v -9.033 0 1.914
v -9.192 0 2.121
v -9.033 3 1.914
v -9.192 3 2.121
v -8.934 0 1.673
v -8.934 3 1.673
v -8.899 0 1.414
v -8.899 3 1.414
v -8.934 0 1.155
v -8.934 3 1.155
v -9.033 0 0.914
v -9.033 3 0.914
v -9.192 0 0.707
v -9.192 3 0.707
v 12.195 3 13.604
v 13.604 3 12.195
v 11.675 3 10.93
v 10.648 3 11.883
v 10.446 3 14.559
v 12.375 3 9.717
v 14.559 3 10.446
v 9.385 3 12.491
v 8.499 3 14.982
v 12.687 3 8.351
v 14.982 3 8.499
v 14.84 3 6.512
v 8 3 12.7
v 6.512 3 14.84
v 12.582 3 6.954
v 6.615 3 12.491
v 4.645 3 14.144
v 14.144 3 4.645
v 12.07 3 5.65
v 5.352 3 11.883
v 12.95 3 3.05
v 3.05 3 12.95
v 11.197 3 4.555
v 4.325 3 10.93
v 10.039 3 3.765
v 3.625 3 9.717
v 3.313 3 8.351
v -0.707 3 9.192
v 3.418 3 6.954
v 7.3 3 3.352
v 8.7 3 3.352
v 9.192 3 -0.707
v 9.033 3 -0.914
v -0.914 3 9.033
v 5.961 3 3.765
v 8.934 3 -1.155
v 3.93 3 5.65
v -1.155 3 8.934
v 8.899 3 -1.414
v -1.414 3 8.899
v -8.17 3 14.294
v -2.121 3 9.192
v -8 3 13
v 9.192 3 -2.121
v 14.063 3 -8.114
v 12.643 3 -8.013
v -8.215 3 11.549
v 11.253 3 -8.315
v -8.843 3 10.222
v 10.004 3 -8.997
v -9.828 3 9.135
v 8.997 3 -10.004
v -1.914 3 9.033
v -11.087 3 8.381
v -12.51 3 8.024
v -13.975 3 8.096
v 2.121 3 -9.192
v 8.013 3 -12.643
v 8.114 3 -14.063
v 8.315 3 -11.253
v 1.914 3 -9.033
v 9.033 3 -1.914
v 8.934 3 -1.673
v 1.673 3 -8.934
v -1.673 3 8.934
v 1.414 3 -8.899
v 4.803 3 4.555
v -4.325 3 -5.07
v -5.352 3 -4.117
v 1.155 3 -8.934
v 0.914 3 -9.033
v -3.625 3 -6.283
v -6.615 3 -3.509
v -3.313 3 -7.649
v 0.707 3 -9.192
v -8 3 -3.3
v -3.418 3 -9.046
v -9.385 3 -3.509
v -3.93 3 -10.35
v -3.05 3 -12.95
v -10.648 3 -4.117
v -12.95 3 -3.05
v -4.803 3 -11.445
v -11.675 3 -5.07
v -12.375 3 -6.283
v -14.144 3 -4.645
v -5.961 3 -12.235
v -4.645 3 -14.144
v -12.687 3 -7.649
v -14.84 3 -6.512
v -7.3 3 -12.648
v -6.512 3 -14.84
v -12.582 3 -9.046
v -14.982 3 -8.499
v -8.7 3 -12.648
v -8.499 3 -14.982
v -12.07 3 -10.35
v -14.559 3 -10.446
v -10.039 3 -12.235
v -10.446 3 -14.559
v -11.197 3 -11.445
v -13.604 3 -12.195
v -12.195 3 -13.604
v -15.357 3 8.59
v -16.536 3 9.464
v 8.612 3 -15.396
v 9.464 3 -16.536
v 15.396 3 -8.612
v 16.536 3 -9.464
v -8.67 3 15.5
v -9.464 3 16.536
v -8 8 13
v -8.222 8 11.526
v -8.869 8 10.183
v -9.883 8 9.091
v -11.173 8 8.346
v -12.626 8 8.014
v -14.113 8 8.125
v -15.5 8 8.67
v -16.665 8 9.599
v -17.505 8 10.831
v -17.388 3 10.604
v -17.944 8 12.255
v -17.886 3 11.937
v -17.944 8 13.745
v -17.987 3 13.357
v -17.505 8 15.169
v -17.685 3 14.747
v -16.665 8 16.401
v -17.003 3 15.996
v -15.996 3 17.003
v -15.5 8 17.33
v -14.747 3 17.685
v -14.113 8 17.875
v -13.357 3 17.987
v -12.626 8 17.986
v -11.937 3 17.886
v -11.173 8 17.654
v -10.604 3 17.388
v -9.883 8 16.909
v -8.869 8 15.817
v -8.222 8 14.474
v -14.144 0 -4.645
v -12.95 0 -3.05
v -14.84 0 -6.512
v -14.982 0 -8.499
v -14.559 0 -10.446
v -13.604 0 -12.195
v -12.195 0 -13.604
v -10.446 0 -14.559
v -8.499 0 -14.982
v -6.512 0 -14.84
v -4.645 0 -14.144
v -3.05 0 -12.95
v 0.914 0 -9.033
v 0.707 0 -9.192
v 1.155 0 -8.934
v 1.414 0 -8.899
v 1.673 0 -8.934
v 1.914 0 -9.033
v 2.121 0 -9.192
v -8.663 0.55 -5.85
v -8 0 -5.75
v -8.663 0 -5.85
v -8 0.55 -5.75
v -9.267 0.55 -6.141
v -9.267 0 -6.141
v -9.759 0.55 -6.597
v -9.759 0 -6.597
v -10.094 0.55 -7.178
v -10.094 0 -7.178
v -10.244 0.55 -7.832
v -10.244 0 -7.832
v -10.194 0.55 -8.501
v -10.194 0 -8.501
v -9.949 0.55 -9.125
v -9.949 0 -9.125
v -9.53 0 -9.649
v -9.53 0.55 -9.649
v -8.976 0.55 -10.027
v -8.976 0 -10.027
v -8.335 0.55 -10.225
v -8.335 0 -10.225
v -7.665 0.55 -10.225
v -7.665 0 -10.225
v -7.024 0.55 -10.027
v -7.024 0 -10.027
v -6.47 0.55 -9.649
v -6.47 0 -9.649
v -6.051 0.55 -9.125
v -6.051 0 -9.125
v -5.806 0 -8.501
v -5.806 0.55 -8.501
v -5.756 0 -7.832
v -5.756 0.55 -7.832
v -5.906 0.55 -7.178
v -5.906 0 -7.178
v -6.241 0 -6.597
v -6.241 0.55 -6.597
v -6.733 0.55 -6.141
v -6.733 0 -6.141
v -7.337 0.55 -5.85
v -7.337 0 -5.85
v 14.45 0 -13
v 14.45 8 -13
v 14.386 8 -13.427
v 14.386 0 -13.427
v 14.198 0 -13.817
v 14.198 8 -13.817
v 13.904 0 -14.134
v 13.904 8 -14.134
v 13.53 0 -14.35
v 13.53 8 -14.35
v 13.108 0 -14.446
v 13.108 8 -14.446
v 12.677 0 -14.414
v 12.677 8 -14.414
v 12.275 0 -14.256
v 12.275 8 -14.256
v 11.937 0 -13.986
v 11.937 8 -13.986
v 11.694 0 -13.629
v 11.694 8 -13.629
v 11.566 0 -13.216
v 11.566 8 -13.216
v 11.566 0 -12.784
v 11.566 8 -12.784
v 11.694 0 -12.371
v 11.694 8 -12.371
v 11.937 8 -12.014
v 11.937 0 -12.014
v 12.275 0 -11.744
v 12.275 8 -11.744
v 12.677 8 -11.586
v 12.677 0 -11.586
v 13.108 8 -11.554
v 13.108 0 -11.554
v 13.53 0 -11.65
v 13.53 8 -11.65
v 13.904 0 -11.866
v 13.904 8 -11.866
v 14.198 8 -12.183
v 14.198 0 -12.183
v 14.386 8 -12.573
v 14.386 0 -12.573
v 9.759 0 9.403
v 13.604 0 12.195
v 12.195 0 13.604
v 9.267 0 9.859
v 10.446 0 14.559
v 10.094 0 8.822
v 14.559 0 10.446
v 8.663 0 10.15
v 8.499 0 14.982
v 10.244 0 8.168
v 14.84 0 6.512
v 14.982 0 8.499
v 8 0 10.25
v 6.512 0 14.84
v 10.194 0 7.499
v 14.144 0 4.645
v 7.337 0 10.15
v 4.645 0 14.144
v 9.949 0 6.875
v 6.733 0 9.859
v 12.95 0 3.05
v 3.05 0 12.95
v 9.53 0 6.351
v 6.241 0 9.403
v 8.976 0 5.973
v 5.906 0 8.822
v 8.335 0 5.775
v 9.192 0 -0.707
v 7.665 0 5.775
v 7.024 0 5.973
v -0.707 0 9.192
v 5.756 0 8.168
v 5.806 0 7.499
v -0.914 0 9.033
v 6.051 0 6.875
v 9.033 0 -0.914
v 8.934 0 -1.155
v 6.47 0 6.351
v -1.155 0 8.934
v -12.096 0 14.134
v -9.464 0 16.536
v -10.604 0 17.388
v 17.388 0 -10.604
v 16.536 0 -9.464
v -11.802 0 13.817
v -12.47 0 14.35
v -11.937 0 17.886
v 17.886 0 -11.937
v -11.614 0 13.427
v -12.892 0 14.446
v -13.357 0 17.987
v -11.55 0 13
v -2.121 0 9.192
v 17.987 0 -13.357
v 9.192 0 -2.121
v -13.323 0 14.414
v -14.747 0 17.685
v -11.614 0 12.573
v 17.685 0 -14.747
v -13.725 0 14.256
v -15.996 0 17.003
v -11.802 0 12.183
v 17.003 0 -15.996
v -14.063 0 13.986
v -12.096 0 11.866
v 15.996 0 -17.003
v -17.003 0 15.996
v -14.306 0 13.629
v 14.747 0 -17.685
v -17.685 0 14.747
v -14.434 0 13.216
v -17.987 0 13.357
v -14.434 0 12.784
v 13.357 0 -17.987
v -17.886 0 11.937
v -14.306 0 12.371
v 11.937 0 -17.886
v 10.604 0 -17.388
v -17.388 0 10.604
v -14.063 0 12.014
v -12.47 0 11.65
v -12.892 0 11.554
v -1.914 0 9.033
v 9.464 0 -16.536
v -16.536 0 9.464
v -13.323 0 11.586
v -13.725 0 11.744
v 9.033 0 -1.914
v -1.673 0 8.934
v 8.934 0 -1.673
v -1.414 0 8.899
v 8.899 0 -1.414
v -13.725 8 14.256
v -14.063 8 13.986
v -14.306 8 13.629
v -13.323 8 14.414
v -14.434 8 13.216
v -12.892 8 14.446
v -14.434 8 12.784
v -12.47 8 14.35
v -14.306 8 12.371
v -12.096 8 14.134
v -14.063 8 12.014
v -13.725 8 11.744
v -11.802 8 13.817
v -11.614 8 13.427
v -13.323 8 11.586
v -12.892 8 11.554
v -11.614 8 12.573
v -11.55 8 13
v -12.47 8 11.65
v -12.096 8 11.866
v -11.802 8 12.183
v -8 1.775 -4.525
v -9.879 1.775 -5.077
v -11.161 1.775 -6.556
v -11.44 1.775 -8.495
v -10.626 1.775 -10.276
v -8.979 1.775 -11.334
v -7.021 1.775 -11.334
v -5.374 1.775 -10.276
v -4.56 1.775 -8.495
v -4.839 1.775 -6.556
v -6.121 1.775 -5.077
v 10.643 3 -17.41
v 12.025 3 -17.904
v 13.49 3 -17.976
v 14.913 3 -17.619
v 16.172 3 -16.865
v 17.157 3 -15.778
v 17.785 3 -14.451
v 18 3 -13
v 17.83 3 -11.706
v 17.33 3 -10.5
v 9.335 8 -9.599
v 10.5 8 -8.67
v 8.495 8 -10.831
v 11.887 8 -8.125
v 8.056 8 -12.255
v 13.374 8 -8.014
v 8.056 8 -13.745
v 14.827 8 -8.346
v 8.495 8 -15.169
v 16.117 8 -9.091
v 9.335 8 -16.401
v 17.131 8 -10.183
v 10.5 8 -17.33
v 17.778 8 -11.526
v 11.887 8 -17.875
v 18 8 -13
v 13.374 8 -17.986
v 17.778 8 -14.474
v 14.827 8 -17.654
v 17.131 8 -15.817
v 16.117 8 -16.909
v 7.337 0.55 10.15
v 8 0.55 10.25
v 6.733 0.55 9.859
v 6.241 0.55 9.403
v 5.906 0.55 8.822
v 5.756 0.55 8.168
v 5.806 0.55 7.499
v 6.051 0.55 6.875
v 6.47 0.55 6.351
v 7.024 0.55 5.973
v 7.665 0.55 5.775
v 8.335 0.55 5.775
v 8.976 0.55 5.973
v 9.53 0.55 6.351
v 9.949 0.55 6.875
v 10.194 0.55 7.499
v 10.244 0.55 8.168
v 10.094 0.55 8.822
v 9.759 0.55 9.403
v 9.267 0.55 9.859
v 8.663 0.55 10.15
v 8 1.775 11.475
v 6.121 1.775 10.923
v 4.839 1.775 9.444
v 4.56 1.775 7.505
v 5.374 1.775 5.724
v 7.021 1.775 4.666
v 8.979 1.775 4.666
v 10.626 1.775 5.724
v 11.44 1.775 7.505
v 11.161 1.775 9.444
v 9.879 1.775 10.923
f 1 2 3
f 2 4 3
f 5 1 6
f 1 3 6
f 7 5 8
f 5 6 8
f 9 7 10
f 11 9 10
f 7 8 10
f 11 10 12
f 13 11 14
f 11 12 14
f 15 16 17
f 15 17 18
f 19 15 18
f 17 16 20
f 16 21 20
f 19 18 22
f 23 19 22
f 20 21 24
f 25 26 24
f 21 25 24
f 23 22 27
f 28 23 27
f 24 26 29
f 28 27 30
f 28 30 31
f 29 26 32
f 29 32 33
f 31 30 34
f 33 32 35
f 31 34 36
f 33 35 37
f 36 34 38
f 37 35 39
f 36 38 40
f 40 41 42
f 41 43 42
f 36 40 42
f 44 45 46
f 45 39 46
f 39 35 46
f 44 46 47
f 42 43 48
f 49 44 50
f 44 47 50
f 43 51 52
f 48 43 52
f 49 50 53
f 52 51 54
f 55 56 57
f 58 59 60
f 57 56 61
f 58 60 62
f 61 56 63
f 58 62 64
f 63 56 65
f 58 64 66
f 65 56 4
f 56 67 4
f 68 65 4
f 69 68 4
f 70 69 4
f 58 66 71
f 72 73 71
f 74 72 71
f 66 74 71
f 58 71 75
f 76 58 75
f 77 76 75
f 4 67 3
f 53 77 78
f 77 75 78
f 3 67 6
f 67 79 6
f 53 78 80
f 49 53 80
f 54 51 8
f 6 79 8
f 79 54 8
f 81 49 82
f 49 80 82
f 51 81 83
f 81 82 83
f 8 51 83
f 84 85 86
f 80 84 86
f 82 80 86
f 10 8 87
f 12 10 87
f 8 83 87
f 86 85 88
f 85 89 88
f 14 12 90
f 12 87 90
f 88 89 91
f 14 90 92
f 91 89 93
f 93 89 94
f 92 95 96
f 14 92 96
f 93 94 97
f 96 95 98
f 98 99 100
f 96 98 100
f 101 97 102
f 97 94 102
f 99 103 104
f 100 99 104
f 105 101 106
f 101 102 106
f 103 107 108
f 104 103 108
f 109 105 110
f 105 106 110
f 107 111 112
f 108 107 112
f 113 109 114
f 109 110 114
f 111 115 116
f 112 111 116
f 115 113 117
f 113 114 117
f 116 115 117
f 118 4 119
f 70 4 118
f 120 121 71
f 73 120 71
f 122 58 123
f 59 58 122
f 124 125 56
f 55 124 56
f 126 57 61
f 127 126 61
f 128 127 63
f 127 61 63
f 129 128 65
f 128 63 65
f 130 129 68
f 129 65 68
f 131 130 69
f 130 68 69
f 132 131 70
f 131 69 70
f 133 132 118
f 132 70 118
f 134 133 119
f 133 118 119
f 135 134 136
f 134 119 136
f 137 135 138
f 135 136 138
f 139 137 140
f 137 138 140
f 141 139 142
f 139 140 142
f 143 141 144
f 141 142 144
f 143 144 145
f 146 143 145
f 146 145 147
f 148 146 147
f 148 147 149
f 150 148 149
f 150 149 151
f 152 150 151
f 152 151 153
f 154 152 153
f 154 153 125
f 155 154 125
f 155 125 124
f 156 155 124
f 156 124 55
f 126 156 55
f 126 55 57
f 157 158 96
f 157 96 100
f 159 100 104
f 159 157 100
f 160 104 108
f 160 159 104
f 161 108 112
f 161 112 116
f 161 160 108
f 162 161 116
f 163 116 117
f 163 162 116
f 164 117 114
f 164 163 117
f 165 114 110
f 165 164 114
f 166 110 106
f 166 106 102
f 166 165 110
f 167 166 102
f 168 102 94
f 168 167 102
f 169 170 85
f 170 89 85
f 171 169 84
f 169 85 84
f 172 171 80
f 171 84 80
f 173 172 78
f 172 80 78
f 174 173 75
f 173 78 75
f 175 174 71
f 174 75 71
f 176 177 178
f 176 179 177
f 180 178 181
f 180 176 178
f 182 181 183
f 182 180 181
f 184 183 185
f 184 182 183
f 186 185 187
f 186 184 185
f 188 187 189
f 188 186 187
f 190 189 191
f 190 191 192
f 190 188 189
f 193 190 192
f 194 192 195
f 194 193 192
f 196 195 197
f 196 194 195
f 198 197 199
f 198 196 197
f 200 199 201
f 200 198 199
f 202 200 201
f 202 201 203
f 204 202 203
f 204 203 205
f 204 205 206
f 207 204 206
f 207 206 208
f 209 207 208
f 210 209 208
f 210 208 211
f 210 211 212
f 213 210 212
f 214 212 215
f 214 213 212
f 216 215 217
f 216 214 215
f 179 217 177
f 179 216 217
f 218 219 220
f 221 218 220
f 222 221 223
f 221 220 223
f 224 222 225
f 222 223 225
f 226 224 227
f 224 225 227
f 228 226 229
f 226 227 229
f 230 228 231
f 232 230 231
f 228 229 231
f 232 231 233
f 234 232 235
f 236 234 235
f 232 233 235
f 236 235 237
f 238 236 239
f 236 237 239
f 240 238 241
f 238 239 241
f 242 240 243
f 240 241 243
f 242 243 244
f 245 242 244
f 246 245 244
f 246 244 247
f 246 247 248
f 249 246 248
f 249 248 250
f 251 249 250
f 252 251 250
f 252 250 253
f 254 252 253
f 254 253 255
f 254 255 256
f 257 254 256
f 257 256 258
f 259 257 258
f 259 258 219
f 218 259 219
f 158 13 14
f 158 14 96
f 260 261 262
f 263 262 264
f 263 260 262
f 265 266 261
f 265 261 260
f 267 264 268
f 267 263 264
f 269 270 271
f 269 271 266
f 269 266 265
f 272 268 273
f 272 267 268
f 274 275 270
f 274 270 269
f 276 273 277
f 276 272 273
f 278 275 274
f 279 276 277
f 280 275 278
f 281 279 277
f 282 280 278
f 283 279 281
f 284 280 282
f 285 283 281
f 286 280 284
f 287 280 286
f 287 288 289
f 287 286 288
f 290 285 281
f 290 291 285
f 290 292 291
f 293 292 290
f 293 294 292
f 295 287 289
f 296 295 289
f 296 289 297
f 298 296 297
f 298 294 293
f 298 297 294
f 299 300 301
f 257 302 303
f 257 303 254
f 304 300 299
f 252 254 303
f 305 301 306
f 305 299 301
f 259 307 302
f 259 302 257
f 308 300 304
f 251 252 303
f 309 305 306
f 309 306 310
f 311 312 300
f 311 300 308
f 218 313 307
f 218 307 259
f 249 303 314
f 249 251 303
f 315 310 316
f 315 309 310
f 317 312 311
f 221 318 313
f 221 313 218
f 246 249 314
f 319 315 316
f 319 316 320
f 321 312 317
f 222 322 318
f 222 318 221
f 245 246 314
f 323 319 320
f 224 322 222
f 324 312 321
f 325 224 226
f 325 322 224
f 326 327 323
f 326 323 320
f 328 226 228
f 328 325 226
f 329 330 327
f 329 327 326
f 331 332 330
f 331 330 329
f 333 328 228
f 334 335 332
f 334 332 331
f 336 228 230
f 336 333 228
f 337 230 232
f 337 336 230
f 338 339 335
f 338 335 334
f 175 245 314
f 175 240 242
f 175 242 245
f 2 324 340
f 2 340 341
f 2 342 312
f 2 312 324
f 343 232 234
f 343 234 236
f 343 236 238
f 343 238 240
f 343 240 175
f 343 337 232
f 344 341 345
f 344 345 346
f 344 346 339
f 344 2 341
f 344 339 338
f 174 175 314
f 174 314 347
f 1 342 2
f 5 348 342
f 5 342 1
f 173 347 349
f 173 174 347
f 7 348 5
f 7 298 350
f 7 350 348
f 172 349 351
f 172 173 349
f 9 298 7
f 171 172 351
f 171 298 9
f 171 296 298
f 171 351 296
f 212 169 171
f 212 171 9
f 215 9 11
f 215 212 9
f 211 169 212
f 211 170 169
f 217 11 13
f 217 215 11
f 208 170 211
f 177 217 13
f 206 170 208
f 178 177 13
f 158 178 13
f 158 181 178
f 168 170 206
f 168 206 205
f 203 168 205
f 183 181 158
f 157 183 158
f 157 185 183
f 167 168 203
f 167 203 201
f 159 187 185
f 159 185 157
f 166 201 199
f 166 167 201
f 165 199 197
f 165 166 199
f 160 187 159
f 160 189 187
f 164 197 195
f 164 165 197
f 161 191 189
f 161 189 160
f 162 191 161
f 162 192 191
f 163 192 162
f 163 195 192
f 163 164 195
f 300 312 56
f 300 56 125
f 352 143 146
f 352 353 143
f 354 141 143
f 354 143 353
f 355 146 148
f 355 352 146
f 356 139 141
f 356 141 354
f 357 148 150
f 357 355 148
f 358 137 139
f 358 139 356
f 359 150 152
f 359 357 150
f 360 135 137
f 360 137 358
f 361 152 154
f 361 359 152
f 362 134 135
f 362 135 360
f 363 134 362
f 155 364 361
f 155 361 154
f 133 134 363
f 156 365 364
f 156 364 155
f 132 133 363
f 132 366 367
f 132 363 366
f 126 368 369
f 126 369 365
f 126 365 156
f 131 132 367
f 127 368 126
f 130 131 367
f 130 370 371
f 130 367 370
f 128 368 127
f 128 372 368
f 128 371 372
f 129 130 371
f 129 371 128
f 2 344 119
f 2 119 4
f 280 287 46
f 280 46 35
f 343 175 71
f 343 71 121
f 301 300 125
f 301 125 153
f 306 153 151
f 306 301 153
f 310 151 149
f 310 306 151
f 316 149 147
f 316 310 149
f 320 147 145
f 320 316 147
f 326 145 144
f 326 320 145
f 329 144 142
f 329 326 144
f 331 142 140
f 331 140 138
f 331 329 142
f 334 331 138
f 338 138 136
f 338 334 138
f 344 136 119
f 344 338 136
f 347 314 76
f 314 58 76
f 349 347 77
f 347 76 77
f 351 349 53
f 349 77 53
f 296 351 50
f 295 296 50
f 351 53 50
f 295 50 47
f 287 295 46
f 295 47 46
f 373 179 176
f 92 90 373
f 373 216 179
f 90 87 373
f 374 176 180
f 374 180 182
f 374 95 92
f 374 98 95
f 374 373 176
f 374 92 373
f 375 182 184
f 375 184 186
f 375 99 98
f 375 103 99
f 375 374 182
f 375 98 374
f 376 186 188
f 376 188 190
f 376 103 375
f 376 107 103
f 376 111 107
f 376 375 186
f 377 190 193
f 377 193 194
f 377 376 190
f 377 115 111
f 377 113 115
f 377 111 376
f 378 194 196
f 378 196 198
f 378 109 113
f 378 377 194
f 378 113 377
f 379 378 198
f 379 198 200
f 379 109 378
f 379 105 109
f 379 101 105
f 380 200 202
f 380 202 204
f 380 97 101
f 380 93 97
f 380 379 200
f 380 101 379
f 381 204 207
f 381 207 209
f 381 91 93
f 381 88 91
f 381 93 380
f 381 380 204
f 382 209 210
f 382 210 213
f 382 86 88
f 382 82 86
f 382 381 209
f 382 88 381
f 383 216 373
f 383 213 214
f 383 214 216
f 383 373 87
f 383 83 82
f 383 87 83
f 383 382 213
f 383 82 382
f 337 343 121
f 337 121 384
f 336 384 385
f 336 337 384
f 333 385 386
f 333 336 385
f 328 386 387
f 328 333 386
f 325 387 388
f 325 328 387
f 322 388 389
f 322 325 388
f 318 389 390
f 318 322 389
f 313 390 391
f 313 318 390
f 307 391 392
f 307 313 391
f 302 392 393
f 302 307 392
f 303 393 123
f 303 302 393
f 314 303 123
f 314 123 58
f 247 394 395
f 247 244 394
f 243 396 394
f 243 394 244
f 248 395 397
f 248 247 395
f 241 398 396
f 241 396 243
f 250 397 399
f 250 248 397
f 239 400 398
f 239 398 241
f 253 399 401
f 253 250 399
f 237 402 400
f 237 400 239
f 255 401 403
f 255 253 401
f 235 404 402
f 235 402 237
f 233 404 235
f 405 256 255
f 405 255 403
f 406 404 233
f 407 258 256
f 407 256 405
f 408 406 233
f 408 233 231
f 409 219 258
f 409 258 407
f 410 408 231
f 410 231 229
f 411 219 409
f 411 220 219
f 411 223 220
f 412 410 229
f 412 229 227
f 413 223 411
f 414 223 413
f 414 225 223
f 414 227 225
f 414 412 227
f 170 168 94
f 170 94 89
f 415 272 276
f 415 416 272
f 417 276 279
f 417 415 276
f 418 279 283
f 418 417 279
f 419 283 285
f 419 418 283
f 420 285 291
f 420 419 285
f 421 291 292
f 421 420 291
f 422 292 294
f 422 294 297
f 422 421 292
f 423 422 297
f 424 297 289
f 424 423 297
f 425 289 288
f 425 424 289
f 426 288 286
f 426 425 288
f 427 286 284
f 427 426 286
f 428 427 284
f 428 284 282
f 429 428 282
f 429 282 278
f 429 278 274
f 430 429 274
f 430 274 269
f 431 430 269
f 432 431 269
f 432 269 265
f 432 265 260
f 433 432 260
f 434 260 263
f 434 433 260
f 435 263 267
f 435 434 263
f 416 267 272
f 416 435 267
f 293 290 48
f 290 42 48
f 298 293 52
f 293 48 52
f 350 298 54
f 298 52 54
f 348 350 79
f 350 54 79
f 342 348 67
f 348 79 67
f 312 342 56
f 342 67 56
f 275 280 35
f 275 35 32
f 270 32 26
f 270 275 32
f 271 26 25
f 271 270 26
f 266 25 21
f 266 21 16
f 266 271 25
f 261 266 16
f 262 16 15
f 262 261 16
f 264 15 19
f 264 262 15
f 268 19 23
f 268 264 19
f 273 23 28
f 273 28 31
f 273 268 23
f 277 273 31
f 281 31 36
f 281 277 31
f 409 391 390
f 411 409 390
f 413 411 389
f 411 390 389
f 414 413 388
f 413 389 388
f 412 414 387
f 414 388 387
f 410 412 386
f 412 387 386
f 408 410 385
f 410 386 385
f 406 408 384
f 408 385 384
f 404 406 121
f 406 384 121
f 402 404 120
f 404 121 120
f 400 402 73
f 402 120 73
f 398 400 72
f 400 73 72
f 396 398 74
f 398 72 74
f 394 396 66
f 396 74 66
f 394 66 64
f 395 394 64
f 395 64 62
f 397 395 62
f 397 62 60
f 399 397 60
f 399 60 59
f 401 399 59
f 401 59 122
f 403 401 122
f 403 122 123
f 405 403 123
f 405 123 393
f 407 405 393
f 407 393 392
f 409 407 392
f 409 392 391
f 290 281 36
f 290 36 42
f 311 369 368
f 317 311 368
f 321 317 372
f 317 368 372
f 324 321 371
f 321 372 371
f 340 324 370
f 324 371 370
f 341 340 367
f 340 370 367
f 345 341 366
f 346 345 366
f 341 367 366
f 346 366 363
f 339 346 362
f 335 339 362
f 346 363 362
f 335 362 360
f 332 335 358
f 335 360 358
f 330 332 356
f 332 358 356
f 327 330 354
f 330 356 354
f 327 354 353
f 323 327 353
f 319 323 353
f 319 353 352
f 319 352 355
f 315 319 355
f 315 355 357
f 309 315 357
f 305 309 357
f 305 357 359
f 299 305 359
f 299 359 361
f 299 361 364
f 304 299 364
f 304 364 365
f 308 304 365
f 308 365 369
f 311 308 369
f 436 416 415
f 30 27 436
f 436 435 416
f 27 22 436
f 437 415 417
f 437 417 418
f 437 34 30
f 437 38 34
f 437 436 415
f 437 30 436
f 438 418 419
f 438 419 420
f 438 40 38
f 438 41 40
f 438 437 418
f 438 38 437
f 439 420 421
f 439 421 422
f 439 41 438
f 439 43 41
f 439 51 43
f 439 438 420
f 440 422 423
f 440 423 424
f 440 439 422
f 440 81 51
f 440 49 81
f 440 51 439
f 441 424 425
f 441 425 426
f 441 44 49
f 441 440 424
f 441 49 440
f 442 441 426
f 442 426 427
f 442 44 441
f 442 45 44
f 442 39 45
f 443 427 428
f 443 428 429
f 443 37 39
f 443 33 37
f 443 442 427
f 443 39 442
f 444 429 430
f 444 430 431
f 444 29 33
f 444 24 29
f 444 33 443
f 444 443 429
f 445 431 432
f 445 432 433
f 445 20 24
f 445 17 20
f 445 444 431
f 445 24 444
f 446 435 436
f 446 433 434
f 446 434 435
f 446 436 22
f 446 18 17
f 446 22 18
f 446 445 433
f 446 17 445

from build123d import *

# Parameters (mm, degrees)
BOSS_EXTRUDE1_DEPTH                          = 3
FILLET1_R                                    = 1
CSK_FOR_M4_COUNTERSUNK_FLAT_HEAD_SCR_2_COUNT = 2
CSK_FOR_M4_COUNTERSUNK_FLAT_HEAD_SCR_2_PITCH = 22.627416998
SKETCH4_R                                    = 5
BOSS_EXTRUDE2_DEPTH                          = 5
SKETCH5_R                                    = 1.45
CUT_EXTRUDE1_DEPTH                           = 9


with BuildPart() as part:
    # Sketch1 → Boss-Extrude1 (new body)
    with BuildSketch(Plane(origin=(0, 0, 0), x_dir=(1, 0, 0), z_dir=(0, 1, 0))):
        with BuildLine():
            Line((-16.535533906, -9.464466094), (-8.485281374, -1.414213562))
            Line((-8.485281374, -1.414213562), (-12.949747468, 3.050252532))
            ThreePointArc((-12.949747468, 3.050252532), (-12.949747468, 12.949747468), (-3.050252532, 12.949747468))
            Line((-3.050252532, 12.949747468), (1.414213562, 8.485281374))
            Line((1.414213562, 8.485281374), (9.464466094, 16.535533906))
            ThreePointArc((9.464466094, 16.535533906), (16.535533906, 16.535533906), (16.535533906, 9.464466094))
            Line((16.535533906, 9.464466094), (8.485281374, 1.414213562))
            Line((8.485281374, 1.414213562), (12.949747468, -3.050252532))
            ThreePointArc((12.949747468, -3.050252532), (12.949747468, -12.949747468), (3.050252532, -12.949747468))
            Line((3.050252532, -12.949747468), (-1.414213562, -8.485281374))
            Line((-1.414213562, -8.485281374), (-9.464466094, -16.535533906))
            ThreePointArc((-9.464466094, -16.535533906), (-16.535533906, -16.535533906), (-16.535533906, -9.464466094))
        make_face()
    extrude(amount=BOSS_EXTRUDE1_DEPTH)

    # Fillet1
    fillet1_edges = [part.edges().sort_by_distance(p)[0] for p in [
        (8.485281374, 1.5, -1.414213562),
        (-1.414213562, 1.5, 8.485281374),
        (-8.485281374, 1.5, 1.414213562),
        (1.414213562, 1.5, -8.485281374),
    ]]
    fillet(fillet1_edges, radius=FILLET1_R)

    # Sketch2 → CSK for M4 Countersunk Flat Head Screw1 (revolve, cut)
    with BuildSketch(Plane(origin=(-8, 3, -8), x_dir=(0, 0, 1), z_dir=(1, 0, 0))):
        Polygon((0, 0), (0, 3), (2.25, 3), (2.25, 2.45), (4.7, 0), align=None)
    csk_for_m4_countersunk_flat_head_screw1 = revolve(axis=Axis((-8, 9.35, -8), (0, -1, 0)), mode=Mode.SUBTRACT)

    # CSK for M4 Countersunk Flat Head Scr 2: CSK for M4 Countersunk Flat Head Screw1 ×2
    with Locations(*[Vector(0.707106781, 0, 0.707106781) * (i * CSK_FOR_M4_COUNTERSUNK_FLAT_HEAD_SCR_2_PITCH) for i in range(1, CSK_FOR_M4_COUNTERSUNK_FLAT_HEAD_SCR_2_COUNT)]):
        add(csk_for_m4_countersunk_flat_head_screw1, mode=Mode.SUBTRACT)

    # Sketch4 → Boss-Extrude2 (add)
    with BuildSketch(Plane(origin=(0, 3, 0), x_dir=(1, 0, 0), z_dir=(0, 1, 0))):
        with Locations((-13, -13)):
            Circle(SKETCH4_R)
        with Locations((13, 13)):
            Circle(SKETCH4_R)
    extrude(amount=BOSS_EXTRUDE2_DEPTH)

    # Sketch5 → Cut-Extrude1 (cut, through all)
    with BuildSketch(Plane(origin=(0, 8, 0), x_dir=(1, 0, 0), z_dir=(0, 1, 0))):
        with Locations((-13, -13)):
            Circle(SKETCH5_R)
        with Locations((13, 13)):
            Circle(SKETCH5_R)
    extrude(amount=-CUT_EXTRUDE1_DEPTH, mode=Mode.SUBTRACT)


solid = part.part
